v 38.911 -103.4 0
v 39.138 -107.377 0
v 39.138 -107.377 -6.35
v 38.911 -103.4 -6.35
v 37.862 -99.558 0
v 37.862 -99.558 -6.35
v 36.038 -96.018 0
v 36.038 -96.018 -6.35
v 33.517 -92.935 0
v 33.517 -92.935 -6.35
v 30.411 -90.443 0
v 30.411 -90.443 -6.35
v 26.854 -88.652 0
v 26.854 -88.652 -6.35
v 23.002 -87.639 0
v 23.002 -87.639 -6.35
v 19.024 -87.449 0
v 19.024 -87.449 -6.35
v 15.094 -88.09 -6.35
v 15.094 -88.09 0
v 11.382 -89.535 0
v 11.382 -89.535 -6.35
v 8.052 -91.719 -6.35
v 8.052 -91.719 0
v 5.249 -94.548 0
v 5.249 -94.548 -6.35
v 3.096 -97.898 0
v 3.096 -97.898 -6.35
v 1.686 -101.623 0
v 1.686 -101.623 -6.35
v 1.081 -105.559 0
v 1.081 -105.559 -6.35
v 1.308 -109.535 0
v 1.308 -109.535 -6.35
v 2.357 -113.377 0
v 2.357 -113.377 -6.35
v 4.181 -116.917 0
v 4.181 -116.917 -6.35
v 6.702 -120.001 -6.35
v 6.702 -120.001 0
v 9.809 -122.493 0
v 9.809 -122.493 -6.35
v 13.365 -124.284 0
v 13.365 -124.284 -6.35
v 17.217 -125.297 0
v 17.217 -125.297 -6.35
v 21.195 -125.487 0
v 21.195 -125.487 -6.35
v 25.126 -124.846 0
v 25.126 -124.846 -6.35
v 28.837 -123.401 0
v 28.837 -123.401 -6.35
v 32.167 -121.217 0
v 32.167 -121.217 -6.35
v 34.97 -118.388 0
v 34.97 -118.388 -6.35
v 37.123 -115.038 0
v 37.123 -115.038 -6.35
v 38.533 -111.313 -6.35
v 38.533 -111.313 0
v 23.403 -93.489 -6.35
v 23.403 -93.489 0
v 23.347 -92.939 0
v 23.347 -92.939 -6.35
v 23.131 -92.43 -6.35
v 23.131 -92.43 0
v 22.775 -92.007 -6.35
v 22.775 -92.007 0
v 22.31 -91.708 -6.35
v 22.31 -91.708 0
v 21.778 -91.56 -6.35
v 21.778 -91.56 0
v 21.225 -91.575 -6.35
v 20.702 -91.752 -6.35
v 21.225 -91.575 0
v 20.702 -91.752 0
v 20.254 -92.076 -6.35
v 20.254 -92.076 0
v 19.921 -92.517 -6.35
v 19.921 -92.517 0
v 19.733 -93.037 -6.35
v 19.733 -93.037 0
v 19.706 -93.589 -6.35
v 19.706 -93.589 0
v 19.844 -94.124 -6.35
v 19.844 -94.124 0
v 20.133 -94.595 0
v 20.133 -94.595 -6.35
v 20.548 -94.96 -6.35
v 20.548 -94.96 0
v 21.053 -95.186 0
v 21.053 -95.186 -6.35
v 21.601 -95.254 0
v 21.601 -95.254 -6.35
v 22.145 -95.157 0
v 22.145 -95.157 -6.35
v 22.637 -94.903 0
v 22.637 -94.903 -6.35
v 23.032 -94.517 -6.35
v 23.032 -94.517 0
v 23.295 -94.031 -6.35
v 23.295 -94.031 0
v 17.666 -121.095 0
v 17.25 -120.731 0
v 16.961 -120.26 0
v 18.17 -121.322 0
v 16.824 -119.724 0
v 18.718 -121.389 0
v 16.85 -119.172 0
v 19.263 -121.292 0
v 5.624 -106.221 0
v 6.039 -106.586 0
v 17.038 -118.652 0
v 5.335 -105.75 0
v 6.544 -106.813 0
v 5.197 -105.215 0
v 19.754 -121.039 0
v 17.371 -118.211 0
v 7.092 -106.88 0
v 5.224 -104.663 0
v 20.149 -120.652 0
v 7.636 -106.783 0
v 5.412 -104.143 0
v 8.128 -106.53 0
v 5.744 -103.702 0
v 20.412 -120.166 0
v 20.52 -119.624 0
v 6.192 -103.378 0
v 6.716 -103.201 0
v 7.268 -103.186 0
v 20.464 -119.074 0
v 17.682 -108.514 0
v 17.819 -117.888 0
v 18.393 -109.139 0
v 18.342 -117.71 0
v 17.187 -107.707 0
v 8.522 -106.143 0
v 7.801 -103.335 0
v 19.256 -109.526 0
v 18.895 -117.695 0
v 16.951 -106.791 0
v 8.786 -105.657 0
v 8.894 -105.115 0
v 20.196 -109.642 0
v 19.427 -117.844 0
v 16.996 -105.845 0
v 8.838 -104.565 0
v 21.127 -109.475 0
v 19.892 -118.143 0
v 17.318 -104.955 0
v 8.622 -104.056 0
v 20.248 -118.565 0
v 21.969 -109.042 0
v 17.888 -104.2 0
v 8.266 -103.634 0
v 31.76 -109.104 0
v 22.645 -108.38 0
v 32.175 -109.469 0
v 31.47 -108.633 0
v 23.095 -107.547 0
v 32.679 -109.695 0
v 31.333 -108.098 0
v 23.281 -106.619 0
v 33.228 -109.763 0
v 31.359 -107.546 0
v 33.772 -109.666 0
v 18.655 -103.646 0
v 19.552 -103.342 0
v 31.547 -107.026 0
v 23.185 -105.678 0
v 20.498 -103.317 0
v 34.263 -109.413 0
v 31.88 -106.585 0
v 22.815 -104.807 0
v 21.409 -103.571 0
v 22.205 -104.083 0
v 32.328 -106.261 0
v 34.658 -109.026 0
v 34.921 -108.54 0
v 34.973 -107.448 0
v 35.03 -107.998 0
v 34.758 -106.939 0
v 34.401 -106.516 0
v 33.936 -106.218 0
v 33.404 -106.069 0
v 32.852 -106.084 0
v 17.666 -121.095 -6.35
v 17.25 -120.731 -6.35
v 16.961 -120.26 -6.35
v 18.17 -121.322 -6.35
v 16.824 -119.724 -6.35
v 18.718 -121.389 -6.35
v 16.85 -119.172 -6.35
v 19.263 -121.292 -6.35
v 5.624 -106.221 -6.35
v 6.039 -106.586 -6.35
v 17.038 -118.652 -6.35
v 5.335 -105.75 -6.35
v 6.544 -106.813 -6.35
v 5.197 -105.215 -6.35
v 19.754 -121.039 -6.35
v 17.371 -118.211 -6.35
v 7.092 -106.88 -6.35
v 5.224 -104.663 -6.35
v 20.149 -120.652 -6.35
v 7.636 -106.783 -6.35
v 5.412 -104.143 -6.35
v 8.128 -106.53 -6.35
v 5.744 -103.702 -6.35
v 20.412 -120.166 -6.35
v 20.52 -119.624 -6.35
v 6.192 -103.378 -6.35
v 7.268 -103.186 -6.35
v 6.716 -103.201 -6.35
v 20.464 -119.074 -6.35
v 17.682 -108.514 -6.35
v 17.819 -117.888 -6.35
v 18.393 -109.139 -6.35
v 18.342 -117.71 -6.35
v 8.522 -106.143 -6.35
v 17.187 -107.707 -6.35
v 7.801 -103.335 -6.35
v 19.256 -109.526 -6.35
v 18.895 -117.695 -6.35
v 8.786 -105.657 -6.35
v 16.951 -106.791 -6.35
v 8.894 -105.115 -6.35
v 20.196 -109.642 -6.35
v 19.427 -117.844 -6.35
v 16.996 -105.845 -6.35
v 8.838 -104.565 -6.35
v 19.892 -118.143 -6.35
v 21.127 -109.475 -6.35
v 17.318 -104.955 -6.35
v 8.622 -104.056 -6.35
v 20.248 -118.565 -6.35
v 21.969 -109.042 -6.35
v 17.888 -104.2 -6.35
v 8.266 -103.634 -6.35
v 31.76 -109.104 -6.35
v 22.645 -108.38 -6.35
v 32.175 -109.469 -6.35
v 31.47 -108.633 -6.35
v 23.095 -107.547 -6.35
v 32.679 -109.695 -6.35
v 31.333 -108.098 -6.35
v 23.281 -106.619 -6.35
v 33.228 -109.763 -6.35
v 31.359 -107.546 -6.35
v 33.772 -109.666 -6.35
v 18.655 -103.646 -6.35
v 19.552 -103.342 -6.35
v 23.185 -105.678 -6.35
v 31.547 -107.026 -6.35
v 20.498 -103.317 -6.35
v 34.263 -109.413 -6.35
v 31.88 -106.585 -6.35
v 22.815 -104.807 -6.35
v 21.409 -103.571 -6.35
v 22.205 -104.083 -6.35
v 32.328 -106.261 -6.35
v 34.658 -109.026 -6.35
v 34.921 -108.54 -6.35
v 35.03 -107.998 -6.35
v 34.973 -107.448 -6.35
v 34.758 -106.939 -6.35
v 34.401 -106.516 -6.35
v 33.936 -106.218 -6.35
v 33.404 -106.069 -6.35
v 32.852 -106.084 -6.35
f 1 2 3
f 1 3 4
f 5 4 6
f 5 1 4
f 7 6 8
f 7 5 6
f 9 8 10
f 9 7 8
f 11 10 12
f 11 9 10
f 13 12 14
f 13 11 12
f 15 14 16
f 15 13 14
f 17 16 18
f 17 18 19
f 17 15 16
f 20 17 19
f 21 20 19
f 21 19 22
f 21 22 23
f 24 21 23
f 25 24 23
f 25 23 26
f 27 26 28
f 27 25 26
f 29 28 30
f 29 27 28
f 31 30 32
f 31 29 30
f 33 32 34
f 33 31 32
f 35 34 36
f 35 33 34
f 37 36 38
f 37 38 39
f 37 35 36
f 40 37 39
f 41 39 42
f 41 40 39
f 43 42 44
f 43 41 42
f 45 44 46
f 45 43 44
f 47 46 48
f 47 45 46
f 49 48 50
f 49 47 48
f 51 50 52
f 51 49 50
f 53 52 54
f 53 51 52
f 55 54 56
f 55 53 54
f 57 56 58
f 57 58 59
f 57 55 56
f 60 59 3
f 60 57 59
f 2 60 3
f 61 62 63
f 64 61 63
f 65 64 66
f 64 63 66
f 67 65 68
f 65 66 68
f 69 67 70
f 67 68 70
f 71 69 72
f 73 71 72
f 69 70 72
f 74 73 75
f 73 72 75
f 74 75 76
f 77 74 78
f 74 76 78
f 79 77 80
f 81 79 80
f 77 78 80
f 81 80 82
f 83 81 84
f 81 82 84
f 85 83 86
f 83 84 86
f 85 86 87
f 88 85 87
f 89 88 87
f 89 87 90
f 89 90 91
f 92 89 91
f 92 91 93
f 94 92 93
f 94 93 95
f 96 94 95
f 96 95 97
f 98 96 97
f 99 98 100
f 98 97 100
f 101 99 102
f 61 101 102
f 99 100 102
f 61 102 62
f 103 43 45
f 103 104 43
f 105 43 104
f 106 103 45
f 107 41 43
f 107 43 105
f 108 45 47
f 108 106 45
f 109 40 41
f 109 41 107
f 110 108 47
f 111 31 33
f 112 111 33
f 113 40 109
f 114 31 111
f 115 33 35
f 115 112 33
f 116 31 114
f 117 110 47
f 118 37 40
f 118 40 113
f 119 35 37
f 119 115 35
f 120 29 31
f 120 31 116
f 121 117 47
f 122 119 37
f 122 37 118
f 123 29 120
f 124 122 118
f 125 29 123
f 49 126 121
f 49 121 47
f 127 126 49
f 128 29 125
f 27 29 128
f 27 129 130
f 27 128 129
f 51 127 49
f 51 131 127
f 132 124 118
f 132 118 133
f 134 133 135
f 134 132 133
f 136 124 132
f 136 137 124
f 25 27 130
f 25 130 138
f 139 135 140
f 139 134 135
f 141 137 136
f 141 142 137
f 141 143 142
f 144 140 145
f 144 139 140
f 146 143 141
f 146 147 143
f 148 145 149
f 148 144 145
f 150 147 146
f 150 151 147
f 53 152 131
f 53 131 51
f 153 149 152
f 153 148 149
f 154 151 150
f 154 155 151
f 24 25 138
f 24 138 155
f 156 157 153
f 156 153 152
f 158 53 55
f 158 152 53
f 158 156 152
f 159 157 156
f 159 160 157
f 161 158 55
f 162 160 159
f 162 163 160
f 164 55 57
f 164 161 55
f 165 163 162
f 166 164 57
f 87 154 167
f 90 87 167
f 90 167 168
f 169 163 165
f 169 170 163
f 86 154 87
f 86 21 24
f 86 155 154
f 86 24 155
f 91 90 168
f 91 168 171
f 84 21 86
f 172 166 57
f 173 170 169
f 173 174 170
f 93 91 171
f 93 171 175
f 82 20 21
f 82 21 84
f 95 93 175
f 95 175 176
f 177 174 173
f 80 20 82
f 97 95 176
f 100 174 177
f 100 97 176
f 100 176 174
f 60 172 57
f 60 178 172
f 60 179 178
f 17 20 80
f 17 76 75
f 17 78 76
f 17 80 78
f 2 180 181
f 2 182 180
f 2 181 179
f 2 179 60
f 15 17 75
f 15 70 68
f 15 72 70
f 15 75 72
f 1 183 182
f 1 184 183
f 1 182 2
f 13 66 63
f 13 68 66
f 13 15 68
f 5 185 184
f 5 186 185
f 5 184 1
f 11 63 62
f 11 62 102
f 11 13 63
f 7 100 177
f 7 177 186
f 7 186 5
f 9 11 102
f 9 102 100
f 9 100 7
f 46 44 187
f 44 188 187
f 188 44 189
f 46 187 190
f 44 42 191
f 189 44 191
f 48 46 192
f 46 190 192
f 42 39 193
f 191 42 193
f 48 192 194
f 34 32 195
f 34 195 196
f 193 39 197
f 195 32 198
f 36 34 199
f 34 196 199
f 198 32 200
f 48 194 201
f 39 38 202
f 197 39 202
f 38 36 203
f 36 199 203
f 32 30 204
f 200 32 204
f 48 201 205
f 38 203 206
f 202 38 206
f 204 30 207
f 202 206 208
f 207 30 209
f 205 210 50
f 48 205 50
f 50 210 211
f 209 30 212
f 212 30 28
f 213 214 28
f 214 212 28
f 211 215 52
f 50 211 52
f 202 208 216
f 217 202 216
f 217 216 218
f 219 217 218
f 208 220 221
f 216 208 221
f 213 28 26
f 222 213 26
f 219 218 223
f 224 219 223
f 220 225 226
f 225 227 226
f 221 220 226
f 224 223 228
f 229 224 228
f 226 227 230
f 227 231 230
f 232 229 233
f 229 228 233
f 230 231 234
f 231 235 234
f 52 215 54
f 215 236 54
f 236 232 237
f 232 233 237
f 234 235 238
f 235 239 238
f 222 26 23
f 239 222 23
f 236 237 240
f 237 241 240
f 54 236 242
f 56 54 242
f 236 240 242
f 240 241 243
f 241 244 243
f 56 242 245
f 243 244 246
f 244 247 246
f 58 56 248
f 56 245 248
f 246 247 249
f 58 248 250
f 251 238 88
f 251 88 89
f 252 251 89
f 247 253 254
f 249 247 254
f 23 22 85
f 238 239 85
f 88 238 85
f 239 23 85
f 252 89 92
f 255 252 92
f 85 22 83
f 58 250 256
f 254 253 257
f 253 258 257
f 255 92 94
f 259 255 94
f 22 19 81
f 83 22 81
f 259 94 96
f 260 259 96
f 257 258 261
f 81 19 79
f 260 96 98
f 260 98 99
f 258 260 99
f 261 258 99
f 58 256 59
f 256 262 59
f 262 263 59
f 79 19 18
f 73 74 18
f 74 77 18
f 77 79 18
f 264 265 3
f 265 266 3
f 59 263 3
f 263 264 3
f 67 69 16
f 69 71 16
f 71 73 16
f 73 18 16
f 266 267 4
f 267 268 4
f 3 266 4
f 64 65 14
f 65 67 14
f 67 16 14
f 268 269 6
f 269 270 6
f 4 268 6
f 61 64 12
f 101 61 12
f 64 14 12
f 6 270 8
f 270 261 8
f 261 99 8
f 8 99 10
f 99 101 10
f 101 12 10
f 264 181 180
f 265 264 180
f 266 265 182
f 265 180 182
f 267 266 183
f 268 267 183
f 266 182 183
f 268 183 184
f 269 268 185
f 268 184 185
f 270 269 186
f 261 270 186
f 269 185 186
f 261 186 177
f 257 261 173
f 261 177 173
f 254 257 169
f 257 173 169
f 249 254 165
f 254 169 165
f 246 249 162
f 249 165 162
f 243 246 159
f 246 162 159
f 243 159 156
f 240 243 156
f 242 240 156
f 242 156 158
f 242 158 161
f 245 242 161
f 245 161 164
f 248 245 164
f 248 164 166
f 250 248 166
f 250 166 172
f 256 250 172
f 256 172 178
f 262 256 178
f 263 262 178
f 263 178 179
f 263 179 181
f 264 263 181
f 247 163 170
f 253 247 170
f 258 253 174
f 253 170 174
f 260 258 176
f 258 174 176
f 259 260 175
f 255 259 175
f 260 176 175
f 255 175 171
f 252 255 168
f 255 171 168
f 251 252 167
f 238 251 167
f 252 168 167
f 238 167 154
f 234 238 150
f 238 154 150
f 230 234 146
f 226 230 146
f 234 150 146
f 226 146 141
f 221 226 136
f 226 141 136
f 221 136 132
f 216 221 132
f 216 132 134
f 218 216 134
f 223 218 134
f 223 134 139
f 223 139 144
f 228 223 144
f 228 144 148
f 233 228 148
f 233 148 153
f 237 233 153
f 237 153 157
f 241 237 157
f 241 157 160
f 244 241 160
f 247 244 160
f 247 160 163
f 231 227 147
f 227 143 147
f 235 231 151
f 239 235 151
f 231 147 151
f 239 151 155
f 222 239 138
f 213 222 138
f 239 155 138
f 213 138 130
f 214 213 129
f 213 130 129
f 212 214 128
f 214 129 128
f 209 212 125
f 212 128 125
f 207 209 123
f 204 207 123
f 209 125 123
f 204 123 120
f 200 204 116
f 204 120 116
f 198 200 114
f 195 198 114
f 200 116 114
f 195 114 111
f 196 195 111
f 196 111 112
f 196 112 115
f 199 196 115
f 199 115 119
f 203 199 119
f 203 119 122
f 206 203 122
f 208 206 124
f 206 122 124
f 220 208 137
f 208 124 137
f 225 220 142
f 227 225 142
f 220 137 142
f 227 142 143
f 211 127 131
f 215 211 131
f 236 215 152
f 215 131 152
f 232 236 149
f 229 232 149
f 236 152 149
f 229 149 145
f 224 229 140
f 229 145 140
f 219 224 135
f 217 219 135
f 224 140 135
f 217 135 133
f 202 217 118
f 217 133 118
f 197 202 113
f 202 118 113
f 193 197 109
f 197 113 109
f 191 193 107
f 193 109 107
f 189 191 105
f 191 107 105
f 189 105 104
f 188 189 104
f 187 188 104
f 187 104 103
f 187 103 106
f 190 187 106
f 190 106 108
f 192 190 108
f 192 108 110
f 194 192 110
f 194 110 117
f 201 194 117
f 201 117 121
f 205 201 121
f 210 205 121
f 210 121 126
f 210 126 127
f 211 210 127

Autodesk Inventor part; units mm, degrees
ref_plane "YZ Plane" through (0, 0, 0) normal (1, 0, 0) x (0, 1, 0)
ref_plane "XZ Plane" through (0, 0, 0) normal (0, 1, 0) x (-1, 0, 0)
ref_plane "XY Plane" through (0, 0, 0) normal (0, 0, 1) x (1, 0, 0)
ref_plane "Work Plane1" through (-7.9975, -173.6428, 0) normal (0, 0, 1) x (0.9989, -0.0477, 0)
sketch "Sketch1" plane through (-7.9975, -173.6428, 0) normal (0, 0, 1) x (0.9989, -0.0477, 0)
  circle A0 centre (24.871, 68.4391) radius 19.05 projected
  circle A1 centre (37.9927, 67.6226) radius 1.8542 projected
  circle A2 centre (25.6875, 81.5607) radius 1.8542 projected
  circle A3 centre (11.7494, 69.2555) radius 1.8542 projected
  circle A4 centre (24.0546, 55.3174) radius 1.8542 projected
  circle A5 centre (24.871, 68.4391) radius 3.175 projected
  point P0 (-0.2983, 173.8266)
extrude "Extrusion1" add sketch "Sketch1" against normal blind 6.35
properties part number "gearGuideDiscOutputStage1"
